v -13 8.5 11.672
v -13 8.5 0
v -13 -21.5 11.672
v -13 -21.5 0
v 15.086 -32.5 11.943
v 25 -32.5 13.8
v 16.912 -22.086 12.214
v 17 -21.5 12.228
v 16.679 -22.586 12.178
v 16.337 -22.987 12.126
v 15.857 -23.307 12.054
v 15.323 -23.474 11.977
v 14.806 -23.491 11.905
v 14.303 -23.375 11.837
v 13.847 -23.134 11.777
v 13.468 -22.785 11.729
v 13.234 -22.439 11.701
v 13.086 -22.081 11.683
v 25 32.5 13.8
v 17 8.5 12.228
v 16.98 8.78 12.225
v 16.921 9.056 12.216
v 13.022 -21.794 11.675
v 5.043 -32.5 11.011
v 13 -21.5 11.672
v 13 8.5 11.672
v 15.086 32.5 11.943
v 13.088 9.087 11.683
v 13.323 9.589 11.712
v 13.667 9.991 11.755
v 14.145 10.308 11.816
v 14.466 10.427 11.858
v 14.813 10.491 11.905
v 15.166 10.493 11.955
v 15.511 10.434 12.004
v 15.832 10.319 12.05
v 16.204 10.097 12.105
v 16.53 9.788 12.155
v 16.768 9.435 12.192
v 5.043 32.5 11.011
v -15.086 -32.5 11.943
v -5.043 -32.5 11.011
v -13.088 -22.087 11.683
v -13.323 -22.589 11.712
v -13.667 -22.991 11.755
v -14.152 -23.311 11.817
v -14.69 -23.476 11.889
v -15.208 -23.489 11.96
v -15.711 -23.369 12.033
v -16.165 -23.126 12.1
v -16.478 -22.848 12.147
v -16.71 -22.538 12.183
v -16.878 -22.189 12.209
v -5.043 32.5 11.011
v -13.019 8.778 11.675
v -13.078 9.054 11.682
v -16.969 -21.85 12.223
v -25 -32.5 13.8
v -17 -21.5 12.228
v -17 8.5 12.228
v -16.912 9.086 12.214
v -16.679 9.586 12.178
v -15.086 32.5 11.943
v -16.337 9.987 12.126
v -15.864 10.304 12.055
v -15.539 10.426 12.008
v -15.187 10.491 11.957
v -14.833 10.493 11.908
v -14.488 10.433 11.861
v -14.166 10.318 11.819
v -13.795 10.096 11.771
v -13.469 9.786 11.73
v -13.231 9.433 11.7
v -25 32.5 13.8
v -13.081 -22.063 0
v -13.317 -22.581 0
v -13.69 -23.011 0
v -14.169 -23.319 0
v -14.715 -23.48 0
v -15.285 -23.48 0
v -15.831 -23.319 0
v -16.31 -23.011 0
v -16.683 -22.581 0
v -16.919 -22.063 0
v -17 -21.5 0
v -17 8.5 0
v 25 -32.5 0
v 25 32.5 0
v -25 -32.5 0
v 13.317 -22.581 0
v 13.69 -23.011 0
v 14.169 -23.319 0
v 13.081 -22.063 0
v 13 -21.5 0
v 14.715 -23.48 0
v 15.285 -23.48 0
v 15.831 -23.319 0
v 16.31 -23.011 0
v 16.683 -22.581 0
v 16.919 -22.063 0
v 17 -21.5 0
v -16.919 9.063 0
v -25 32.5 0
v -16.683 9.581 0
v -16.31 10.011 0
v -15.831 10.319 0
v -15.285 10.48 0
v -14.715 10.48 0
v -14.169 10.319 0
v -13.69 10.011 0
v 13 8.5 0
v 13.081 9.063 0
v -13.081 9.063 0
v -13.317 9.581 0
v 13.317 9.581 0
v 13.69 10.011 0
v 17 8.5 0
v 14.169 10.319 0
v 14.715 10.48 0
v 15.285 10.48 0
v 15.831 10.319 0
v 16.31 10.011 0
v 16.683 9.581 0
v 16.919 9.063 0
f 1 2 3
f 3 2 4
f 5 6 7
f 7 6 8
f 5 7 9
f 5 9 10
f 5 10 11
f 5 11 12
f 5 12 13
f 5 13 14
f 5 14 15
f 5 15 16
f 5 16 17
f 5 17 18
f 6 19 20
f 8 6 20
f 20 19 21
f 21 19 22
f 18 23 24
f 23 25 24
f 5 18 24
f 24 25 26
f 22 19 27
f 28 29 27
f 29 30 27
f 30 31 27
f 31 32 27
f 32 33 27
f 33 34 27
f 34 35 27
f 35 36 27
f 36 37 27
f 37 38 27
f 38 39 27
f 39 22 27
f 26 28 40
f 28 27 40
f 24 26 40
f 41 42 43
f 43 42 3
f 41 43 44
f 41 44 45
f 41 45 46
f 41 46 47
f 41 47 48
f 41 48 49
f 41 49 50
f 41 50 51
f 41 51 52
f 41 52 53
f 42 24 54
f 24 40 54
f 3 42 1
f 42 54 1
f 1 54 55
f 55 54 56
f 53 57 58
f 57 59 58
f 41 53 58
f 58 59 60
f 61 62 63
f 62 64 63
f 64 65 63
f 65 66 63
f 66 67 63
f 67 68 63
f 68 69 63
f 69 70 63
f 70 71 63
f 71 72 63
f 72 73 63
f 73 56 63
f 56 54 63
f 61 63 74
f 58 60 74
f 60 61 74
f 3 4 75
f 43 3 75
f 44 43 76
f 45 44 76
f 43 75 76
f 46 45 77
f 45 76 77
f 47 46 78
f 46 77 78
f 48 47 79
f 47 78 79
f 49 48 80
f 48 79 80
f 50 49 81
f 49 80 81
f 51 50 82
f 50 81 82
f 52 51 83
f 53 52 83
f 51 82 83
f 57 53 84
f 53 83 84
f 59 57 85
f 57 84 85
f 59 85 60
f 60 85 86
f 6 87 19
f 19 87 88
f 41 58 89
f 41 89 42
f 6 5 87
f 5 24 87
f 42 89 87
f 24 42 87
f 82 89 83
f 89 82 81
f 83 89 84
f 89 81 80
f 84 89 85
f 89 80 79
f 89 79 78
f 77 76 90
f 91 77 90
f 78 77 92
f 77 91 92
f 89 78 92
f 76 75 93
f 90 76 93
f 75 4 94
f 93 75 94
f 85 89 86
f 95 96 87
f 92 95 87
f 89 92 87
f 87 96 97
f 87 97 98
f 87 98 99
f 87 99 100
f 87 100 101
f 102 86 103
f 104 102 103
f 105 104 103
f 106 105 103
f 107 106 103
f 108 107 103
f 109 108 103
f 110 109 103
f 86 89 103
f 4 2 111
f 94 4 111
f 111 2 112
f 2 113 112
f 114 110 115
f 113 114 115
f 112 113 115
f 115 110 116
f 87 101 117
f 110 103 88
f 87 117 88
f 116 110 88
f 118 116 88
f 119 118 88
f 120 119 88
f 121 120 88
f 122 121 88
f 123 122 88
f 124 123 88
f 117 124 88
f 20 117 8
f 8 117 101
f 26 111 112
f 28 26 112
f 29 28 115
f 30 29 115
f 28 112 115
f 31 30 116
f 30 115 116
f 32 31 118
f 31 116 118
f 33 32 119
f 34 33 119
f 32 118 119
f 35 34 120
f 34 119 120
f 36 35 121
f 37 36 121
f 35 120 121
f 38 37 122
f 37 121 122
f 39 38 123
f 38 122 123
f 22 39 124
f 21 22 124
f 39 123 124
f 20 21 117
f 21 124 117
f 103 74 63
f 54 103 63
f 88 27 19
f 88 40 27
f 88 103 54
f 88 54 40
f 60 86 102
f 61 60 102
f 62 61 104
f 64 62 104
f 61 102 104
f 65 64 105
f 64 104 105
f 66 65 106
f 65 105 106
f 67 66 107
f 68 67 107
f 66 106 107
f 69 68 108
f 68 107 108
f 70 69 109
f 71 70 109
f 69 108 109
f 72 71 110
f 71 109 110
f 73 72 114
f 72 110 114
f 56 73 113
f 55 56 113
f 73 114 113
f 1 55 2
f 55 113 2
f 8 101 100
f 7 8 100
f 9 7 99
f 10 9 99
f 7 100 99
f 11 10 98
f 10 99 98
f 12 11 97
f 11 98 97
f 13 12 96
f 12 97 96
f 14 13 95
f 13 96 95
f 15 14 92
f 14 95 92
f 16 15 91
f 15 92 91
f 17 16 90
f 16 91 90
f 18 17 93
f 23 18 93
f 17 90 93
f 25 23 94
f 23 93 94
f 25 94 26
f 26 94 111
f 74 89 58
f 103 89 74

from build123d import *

# Parameters (mm, degrees)
F0_W     = 50
F0_H     = 65
F1_DEPTH = 13.8
F2_R     = 109
F3_DEPTH = 65
F5_DEPTH = 15


with BuildPart() as f1:
    # F0 (on Top) → F1 (new body)
    with BuildSketch(Plane.XY):
        Rectangle(F0_W, F0_H)
    extrude(amount=F1_DEPTH)

    # F2 (on face) → F3 (cut)
    with BuildSketch(Plane(origin=(0, 32.5, 0), x_dir=(-1, 0, 0), z_dir=(0, 1, 0))):
        with Locations((0, 119.894297679)):
            Circle(F2_R)
    extrude(amount=-F3_DEPTH, mode=Mode.SUBTRACT)

    # F4 (on face) → F5 (cut)
    with BuildSketch(Plane(origin=(0, 0, 0), x_dir=(1, 0, 0), z_dir=(0, 0, -1))):
        with BuildLine():
            ThreePointArc((-17, 21.5), (-15, 19.5), (-13, 21.5))
            Line((-13, 21.5), (-17, 21.5))
        make_face()
        with BuildLine():
            Line((-17, 21.5), (-13, 21.5))
            ThreePointArc((-13, 21.5), (-15, 23.5), (-17, 21.5))
        make_face()
        with BuildLine():
            Line((-13, -8.5), (-13, 21.5))
            ThreePointArc((-13, 21.5), (-15, 19.5), (-17, 21.5))
            Line((-17, 21.5), (-17, -8.5))
            ThreePointArc((-17, -8.5), (-15, -6.5), (-13, -8.5))
        make_face()
        with BuildLine():
            ThreePointArc((-17, -8.5), (-15, -10.5), (-13, -8.5))
            Line((-13, -8.5), (-17, -8.5))
        make_face()
        with BuildLine():
            Line((-17, -8.5), (-13, -8.5))
            ThreePointArc((-13, -8.5), (-15, -6.5), (-17, -8.5))
        make_face()
        with BuildLine():
            ThreePointArc((17, 21.5), (15, 23.5), (13, 21.5))
            Line((13, 21.5), (17, 21.5))
        make_face()
        with BuildLine():
            ThreePointArc((17, 21.5), (15, 19.5), (13, 21.5))
            Line((13, 21.5), (13, -8.5))
            ThreePointArc((13, -8.5), (15, -6.5), (17, -8.5))
            Line((17, -8.5), (17, 21.5))
        make_face()
        with BuildLine():
            Line((17, 21.5), (13, 21.5))
            ThreePointArc((13, 21.5), (15, 19.5), (17, 21.5))
        make_face()
        with BuildLine():
            ThreePointArc((17, -8.5), (15, -6.5), (13, -8.5))
            Line((13, -8.5), (17, -8.5))
        make_face()
        with BuildLine():
            Line((17, -8.5), (13, -8.5))
            ThreePointArc((13, -8.5), (15, -10.5), (17, -8.5))
        make_face()
    extrude(amount=-F5_DEPTH, mode=Mode.SUBTRACT)


solid = f1.part
